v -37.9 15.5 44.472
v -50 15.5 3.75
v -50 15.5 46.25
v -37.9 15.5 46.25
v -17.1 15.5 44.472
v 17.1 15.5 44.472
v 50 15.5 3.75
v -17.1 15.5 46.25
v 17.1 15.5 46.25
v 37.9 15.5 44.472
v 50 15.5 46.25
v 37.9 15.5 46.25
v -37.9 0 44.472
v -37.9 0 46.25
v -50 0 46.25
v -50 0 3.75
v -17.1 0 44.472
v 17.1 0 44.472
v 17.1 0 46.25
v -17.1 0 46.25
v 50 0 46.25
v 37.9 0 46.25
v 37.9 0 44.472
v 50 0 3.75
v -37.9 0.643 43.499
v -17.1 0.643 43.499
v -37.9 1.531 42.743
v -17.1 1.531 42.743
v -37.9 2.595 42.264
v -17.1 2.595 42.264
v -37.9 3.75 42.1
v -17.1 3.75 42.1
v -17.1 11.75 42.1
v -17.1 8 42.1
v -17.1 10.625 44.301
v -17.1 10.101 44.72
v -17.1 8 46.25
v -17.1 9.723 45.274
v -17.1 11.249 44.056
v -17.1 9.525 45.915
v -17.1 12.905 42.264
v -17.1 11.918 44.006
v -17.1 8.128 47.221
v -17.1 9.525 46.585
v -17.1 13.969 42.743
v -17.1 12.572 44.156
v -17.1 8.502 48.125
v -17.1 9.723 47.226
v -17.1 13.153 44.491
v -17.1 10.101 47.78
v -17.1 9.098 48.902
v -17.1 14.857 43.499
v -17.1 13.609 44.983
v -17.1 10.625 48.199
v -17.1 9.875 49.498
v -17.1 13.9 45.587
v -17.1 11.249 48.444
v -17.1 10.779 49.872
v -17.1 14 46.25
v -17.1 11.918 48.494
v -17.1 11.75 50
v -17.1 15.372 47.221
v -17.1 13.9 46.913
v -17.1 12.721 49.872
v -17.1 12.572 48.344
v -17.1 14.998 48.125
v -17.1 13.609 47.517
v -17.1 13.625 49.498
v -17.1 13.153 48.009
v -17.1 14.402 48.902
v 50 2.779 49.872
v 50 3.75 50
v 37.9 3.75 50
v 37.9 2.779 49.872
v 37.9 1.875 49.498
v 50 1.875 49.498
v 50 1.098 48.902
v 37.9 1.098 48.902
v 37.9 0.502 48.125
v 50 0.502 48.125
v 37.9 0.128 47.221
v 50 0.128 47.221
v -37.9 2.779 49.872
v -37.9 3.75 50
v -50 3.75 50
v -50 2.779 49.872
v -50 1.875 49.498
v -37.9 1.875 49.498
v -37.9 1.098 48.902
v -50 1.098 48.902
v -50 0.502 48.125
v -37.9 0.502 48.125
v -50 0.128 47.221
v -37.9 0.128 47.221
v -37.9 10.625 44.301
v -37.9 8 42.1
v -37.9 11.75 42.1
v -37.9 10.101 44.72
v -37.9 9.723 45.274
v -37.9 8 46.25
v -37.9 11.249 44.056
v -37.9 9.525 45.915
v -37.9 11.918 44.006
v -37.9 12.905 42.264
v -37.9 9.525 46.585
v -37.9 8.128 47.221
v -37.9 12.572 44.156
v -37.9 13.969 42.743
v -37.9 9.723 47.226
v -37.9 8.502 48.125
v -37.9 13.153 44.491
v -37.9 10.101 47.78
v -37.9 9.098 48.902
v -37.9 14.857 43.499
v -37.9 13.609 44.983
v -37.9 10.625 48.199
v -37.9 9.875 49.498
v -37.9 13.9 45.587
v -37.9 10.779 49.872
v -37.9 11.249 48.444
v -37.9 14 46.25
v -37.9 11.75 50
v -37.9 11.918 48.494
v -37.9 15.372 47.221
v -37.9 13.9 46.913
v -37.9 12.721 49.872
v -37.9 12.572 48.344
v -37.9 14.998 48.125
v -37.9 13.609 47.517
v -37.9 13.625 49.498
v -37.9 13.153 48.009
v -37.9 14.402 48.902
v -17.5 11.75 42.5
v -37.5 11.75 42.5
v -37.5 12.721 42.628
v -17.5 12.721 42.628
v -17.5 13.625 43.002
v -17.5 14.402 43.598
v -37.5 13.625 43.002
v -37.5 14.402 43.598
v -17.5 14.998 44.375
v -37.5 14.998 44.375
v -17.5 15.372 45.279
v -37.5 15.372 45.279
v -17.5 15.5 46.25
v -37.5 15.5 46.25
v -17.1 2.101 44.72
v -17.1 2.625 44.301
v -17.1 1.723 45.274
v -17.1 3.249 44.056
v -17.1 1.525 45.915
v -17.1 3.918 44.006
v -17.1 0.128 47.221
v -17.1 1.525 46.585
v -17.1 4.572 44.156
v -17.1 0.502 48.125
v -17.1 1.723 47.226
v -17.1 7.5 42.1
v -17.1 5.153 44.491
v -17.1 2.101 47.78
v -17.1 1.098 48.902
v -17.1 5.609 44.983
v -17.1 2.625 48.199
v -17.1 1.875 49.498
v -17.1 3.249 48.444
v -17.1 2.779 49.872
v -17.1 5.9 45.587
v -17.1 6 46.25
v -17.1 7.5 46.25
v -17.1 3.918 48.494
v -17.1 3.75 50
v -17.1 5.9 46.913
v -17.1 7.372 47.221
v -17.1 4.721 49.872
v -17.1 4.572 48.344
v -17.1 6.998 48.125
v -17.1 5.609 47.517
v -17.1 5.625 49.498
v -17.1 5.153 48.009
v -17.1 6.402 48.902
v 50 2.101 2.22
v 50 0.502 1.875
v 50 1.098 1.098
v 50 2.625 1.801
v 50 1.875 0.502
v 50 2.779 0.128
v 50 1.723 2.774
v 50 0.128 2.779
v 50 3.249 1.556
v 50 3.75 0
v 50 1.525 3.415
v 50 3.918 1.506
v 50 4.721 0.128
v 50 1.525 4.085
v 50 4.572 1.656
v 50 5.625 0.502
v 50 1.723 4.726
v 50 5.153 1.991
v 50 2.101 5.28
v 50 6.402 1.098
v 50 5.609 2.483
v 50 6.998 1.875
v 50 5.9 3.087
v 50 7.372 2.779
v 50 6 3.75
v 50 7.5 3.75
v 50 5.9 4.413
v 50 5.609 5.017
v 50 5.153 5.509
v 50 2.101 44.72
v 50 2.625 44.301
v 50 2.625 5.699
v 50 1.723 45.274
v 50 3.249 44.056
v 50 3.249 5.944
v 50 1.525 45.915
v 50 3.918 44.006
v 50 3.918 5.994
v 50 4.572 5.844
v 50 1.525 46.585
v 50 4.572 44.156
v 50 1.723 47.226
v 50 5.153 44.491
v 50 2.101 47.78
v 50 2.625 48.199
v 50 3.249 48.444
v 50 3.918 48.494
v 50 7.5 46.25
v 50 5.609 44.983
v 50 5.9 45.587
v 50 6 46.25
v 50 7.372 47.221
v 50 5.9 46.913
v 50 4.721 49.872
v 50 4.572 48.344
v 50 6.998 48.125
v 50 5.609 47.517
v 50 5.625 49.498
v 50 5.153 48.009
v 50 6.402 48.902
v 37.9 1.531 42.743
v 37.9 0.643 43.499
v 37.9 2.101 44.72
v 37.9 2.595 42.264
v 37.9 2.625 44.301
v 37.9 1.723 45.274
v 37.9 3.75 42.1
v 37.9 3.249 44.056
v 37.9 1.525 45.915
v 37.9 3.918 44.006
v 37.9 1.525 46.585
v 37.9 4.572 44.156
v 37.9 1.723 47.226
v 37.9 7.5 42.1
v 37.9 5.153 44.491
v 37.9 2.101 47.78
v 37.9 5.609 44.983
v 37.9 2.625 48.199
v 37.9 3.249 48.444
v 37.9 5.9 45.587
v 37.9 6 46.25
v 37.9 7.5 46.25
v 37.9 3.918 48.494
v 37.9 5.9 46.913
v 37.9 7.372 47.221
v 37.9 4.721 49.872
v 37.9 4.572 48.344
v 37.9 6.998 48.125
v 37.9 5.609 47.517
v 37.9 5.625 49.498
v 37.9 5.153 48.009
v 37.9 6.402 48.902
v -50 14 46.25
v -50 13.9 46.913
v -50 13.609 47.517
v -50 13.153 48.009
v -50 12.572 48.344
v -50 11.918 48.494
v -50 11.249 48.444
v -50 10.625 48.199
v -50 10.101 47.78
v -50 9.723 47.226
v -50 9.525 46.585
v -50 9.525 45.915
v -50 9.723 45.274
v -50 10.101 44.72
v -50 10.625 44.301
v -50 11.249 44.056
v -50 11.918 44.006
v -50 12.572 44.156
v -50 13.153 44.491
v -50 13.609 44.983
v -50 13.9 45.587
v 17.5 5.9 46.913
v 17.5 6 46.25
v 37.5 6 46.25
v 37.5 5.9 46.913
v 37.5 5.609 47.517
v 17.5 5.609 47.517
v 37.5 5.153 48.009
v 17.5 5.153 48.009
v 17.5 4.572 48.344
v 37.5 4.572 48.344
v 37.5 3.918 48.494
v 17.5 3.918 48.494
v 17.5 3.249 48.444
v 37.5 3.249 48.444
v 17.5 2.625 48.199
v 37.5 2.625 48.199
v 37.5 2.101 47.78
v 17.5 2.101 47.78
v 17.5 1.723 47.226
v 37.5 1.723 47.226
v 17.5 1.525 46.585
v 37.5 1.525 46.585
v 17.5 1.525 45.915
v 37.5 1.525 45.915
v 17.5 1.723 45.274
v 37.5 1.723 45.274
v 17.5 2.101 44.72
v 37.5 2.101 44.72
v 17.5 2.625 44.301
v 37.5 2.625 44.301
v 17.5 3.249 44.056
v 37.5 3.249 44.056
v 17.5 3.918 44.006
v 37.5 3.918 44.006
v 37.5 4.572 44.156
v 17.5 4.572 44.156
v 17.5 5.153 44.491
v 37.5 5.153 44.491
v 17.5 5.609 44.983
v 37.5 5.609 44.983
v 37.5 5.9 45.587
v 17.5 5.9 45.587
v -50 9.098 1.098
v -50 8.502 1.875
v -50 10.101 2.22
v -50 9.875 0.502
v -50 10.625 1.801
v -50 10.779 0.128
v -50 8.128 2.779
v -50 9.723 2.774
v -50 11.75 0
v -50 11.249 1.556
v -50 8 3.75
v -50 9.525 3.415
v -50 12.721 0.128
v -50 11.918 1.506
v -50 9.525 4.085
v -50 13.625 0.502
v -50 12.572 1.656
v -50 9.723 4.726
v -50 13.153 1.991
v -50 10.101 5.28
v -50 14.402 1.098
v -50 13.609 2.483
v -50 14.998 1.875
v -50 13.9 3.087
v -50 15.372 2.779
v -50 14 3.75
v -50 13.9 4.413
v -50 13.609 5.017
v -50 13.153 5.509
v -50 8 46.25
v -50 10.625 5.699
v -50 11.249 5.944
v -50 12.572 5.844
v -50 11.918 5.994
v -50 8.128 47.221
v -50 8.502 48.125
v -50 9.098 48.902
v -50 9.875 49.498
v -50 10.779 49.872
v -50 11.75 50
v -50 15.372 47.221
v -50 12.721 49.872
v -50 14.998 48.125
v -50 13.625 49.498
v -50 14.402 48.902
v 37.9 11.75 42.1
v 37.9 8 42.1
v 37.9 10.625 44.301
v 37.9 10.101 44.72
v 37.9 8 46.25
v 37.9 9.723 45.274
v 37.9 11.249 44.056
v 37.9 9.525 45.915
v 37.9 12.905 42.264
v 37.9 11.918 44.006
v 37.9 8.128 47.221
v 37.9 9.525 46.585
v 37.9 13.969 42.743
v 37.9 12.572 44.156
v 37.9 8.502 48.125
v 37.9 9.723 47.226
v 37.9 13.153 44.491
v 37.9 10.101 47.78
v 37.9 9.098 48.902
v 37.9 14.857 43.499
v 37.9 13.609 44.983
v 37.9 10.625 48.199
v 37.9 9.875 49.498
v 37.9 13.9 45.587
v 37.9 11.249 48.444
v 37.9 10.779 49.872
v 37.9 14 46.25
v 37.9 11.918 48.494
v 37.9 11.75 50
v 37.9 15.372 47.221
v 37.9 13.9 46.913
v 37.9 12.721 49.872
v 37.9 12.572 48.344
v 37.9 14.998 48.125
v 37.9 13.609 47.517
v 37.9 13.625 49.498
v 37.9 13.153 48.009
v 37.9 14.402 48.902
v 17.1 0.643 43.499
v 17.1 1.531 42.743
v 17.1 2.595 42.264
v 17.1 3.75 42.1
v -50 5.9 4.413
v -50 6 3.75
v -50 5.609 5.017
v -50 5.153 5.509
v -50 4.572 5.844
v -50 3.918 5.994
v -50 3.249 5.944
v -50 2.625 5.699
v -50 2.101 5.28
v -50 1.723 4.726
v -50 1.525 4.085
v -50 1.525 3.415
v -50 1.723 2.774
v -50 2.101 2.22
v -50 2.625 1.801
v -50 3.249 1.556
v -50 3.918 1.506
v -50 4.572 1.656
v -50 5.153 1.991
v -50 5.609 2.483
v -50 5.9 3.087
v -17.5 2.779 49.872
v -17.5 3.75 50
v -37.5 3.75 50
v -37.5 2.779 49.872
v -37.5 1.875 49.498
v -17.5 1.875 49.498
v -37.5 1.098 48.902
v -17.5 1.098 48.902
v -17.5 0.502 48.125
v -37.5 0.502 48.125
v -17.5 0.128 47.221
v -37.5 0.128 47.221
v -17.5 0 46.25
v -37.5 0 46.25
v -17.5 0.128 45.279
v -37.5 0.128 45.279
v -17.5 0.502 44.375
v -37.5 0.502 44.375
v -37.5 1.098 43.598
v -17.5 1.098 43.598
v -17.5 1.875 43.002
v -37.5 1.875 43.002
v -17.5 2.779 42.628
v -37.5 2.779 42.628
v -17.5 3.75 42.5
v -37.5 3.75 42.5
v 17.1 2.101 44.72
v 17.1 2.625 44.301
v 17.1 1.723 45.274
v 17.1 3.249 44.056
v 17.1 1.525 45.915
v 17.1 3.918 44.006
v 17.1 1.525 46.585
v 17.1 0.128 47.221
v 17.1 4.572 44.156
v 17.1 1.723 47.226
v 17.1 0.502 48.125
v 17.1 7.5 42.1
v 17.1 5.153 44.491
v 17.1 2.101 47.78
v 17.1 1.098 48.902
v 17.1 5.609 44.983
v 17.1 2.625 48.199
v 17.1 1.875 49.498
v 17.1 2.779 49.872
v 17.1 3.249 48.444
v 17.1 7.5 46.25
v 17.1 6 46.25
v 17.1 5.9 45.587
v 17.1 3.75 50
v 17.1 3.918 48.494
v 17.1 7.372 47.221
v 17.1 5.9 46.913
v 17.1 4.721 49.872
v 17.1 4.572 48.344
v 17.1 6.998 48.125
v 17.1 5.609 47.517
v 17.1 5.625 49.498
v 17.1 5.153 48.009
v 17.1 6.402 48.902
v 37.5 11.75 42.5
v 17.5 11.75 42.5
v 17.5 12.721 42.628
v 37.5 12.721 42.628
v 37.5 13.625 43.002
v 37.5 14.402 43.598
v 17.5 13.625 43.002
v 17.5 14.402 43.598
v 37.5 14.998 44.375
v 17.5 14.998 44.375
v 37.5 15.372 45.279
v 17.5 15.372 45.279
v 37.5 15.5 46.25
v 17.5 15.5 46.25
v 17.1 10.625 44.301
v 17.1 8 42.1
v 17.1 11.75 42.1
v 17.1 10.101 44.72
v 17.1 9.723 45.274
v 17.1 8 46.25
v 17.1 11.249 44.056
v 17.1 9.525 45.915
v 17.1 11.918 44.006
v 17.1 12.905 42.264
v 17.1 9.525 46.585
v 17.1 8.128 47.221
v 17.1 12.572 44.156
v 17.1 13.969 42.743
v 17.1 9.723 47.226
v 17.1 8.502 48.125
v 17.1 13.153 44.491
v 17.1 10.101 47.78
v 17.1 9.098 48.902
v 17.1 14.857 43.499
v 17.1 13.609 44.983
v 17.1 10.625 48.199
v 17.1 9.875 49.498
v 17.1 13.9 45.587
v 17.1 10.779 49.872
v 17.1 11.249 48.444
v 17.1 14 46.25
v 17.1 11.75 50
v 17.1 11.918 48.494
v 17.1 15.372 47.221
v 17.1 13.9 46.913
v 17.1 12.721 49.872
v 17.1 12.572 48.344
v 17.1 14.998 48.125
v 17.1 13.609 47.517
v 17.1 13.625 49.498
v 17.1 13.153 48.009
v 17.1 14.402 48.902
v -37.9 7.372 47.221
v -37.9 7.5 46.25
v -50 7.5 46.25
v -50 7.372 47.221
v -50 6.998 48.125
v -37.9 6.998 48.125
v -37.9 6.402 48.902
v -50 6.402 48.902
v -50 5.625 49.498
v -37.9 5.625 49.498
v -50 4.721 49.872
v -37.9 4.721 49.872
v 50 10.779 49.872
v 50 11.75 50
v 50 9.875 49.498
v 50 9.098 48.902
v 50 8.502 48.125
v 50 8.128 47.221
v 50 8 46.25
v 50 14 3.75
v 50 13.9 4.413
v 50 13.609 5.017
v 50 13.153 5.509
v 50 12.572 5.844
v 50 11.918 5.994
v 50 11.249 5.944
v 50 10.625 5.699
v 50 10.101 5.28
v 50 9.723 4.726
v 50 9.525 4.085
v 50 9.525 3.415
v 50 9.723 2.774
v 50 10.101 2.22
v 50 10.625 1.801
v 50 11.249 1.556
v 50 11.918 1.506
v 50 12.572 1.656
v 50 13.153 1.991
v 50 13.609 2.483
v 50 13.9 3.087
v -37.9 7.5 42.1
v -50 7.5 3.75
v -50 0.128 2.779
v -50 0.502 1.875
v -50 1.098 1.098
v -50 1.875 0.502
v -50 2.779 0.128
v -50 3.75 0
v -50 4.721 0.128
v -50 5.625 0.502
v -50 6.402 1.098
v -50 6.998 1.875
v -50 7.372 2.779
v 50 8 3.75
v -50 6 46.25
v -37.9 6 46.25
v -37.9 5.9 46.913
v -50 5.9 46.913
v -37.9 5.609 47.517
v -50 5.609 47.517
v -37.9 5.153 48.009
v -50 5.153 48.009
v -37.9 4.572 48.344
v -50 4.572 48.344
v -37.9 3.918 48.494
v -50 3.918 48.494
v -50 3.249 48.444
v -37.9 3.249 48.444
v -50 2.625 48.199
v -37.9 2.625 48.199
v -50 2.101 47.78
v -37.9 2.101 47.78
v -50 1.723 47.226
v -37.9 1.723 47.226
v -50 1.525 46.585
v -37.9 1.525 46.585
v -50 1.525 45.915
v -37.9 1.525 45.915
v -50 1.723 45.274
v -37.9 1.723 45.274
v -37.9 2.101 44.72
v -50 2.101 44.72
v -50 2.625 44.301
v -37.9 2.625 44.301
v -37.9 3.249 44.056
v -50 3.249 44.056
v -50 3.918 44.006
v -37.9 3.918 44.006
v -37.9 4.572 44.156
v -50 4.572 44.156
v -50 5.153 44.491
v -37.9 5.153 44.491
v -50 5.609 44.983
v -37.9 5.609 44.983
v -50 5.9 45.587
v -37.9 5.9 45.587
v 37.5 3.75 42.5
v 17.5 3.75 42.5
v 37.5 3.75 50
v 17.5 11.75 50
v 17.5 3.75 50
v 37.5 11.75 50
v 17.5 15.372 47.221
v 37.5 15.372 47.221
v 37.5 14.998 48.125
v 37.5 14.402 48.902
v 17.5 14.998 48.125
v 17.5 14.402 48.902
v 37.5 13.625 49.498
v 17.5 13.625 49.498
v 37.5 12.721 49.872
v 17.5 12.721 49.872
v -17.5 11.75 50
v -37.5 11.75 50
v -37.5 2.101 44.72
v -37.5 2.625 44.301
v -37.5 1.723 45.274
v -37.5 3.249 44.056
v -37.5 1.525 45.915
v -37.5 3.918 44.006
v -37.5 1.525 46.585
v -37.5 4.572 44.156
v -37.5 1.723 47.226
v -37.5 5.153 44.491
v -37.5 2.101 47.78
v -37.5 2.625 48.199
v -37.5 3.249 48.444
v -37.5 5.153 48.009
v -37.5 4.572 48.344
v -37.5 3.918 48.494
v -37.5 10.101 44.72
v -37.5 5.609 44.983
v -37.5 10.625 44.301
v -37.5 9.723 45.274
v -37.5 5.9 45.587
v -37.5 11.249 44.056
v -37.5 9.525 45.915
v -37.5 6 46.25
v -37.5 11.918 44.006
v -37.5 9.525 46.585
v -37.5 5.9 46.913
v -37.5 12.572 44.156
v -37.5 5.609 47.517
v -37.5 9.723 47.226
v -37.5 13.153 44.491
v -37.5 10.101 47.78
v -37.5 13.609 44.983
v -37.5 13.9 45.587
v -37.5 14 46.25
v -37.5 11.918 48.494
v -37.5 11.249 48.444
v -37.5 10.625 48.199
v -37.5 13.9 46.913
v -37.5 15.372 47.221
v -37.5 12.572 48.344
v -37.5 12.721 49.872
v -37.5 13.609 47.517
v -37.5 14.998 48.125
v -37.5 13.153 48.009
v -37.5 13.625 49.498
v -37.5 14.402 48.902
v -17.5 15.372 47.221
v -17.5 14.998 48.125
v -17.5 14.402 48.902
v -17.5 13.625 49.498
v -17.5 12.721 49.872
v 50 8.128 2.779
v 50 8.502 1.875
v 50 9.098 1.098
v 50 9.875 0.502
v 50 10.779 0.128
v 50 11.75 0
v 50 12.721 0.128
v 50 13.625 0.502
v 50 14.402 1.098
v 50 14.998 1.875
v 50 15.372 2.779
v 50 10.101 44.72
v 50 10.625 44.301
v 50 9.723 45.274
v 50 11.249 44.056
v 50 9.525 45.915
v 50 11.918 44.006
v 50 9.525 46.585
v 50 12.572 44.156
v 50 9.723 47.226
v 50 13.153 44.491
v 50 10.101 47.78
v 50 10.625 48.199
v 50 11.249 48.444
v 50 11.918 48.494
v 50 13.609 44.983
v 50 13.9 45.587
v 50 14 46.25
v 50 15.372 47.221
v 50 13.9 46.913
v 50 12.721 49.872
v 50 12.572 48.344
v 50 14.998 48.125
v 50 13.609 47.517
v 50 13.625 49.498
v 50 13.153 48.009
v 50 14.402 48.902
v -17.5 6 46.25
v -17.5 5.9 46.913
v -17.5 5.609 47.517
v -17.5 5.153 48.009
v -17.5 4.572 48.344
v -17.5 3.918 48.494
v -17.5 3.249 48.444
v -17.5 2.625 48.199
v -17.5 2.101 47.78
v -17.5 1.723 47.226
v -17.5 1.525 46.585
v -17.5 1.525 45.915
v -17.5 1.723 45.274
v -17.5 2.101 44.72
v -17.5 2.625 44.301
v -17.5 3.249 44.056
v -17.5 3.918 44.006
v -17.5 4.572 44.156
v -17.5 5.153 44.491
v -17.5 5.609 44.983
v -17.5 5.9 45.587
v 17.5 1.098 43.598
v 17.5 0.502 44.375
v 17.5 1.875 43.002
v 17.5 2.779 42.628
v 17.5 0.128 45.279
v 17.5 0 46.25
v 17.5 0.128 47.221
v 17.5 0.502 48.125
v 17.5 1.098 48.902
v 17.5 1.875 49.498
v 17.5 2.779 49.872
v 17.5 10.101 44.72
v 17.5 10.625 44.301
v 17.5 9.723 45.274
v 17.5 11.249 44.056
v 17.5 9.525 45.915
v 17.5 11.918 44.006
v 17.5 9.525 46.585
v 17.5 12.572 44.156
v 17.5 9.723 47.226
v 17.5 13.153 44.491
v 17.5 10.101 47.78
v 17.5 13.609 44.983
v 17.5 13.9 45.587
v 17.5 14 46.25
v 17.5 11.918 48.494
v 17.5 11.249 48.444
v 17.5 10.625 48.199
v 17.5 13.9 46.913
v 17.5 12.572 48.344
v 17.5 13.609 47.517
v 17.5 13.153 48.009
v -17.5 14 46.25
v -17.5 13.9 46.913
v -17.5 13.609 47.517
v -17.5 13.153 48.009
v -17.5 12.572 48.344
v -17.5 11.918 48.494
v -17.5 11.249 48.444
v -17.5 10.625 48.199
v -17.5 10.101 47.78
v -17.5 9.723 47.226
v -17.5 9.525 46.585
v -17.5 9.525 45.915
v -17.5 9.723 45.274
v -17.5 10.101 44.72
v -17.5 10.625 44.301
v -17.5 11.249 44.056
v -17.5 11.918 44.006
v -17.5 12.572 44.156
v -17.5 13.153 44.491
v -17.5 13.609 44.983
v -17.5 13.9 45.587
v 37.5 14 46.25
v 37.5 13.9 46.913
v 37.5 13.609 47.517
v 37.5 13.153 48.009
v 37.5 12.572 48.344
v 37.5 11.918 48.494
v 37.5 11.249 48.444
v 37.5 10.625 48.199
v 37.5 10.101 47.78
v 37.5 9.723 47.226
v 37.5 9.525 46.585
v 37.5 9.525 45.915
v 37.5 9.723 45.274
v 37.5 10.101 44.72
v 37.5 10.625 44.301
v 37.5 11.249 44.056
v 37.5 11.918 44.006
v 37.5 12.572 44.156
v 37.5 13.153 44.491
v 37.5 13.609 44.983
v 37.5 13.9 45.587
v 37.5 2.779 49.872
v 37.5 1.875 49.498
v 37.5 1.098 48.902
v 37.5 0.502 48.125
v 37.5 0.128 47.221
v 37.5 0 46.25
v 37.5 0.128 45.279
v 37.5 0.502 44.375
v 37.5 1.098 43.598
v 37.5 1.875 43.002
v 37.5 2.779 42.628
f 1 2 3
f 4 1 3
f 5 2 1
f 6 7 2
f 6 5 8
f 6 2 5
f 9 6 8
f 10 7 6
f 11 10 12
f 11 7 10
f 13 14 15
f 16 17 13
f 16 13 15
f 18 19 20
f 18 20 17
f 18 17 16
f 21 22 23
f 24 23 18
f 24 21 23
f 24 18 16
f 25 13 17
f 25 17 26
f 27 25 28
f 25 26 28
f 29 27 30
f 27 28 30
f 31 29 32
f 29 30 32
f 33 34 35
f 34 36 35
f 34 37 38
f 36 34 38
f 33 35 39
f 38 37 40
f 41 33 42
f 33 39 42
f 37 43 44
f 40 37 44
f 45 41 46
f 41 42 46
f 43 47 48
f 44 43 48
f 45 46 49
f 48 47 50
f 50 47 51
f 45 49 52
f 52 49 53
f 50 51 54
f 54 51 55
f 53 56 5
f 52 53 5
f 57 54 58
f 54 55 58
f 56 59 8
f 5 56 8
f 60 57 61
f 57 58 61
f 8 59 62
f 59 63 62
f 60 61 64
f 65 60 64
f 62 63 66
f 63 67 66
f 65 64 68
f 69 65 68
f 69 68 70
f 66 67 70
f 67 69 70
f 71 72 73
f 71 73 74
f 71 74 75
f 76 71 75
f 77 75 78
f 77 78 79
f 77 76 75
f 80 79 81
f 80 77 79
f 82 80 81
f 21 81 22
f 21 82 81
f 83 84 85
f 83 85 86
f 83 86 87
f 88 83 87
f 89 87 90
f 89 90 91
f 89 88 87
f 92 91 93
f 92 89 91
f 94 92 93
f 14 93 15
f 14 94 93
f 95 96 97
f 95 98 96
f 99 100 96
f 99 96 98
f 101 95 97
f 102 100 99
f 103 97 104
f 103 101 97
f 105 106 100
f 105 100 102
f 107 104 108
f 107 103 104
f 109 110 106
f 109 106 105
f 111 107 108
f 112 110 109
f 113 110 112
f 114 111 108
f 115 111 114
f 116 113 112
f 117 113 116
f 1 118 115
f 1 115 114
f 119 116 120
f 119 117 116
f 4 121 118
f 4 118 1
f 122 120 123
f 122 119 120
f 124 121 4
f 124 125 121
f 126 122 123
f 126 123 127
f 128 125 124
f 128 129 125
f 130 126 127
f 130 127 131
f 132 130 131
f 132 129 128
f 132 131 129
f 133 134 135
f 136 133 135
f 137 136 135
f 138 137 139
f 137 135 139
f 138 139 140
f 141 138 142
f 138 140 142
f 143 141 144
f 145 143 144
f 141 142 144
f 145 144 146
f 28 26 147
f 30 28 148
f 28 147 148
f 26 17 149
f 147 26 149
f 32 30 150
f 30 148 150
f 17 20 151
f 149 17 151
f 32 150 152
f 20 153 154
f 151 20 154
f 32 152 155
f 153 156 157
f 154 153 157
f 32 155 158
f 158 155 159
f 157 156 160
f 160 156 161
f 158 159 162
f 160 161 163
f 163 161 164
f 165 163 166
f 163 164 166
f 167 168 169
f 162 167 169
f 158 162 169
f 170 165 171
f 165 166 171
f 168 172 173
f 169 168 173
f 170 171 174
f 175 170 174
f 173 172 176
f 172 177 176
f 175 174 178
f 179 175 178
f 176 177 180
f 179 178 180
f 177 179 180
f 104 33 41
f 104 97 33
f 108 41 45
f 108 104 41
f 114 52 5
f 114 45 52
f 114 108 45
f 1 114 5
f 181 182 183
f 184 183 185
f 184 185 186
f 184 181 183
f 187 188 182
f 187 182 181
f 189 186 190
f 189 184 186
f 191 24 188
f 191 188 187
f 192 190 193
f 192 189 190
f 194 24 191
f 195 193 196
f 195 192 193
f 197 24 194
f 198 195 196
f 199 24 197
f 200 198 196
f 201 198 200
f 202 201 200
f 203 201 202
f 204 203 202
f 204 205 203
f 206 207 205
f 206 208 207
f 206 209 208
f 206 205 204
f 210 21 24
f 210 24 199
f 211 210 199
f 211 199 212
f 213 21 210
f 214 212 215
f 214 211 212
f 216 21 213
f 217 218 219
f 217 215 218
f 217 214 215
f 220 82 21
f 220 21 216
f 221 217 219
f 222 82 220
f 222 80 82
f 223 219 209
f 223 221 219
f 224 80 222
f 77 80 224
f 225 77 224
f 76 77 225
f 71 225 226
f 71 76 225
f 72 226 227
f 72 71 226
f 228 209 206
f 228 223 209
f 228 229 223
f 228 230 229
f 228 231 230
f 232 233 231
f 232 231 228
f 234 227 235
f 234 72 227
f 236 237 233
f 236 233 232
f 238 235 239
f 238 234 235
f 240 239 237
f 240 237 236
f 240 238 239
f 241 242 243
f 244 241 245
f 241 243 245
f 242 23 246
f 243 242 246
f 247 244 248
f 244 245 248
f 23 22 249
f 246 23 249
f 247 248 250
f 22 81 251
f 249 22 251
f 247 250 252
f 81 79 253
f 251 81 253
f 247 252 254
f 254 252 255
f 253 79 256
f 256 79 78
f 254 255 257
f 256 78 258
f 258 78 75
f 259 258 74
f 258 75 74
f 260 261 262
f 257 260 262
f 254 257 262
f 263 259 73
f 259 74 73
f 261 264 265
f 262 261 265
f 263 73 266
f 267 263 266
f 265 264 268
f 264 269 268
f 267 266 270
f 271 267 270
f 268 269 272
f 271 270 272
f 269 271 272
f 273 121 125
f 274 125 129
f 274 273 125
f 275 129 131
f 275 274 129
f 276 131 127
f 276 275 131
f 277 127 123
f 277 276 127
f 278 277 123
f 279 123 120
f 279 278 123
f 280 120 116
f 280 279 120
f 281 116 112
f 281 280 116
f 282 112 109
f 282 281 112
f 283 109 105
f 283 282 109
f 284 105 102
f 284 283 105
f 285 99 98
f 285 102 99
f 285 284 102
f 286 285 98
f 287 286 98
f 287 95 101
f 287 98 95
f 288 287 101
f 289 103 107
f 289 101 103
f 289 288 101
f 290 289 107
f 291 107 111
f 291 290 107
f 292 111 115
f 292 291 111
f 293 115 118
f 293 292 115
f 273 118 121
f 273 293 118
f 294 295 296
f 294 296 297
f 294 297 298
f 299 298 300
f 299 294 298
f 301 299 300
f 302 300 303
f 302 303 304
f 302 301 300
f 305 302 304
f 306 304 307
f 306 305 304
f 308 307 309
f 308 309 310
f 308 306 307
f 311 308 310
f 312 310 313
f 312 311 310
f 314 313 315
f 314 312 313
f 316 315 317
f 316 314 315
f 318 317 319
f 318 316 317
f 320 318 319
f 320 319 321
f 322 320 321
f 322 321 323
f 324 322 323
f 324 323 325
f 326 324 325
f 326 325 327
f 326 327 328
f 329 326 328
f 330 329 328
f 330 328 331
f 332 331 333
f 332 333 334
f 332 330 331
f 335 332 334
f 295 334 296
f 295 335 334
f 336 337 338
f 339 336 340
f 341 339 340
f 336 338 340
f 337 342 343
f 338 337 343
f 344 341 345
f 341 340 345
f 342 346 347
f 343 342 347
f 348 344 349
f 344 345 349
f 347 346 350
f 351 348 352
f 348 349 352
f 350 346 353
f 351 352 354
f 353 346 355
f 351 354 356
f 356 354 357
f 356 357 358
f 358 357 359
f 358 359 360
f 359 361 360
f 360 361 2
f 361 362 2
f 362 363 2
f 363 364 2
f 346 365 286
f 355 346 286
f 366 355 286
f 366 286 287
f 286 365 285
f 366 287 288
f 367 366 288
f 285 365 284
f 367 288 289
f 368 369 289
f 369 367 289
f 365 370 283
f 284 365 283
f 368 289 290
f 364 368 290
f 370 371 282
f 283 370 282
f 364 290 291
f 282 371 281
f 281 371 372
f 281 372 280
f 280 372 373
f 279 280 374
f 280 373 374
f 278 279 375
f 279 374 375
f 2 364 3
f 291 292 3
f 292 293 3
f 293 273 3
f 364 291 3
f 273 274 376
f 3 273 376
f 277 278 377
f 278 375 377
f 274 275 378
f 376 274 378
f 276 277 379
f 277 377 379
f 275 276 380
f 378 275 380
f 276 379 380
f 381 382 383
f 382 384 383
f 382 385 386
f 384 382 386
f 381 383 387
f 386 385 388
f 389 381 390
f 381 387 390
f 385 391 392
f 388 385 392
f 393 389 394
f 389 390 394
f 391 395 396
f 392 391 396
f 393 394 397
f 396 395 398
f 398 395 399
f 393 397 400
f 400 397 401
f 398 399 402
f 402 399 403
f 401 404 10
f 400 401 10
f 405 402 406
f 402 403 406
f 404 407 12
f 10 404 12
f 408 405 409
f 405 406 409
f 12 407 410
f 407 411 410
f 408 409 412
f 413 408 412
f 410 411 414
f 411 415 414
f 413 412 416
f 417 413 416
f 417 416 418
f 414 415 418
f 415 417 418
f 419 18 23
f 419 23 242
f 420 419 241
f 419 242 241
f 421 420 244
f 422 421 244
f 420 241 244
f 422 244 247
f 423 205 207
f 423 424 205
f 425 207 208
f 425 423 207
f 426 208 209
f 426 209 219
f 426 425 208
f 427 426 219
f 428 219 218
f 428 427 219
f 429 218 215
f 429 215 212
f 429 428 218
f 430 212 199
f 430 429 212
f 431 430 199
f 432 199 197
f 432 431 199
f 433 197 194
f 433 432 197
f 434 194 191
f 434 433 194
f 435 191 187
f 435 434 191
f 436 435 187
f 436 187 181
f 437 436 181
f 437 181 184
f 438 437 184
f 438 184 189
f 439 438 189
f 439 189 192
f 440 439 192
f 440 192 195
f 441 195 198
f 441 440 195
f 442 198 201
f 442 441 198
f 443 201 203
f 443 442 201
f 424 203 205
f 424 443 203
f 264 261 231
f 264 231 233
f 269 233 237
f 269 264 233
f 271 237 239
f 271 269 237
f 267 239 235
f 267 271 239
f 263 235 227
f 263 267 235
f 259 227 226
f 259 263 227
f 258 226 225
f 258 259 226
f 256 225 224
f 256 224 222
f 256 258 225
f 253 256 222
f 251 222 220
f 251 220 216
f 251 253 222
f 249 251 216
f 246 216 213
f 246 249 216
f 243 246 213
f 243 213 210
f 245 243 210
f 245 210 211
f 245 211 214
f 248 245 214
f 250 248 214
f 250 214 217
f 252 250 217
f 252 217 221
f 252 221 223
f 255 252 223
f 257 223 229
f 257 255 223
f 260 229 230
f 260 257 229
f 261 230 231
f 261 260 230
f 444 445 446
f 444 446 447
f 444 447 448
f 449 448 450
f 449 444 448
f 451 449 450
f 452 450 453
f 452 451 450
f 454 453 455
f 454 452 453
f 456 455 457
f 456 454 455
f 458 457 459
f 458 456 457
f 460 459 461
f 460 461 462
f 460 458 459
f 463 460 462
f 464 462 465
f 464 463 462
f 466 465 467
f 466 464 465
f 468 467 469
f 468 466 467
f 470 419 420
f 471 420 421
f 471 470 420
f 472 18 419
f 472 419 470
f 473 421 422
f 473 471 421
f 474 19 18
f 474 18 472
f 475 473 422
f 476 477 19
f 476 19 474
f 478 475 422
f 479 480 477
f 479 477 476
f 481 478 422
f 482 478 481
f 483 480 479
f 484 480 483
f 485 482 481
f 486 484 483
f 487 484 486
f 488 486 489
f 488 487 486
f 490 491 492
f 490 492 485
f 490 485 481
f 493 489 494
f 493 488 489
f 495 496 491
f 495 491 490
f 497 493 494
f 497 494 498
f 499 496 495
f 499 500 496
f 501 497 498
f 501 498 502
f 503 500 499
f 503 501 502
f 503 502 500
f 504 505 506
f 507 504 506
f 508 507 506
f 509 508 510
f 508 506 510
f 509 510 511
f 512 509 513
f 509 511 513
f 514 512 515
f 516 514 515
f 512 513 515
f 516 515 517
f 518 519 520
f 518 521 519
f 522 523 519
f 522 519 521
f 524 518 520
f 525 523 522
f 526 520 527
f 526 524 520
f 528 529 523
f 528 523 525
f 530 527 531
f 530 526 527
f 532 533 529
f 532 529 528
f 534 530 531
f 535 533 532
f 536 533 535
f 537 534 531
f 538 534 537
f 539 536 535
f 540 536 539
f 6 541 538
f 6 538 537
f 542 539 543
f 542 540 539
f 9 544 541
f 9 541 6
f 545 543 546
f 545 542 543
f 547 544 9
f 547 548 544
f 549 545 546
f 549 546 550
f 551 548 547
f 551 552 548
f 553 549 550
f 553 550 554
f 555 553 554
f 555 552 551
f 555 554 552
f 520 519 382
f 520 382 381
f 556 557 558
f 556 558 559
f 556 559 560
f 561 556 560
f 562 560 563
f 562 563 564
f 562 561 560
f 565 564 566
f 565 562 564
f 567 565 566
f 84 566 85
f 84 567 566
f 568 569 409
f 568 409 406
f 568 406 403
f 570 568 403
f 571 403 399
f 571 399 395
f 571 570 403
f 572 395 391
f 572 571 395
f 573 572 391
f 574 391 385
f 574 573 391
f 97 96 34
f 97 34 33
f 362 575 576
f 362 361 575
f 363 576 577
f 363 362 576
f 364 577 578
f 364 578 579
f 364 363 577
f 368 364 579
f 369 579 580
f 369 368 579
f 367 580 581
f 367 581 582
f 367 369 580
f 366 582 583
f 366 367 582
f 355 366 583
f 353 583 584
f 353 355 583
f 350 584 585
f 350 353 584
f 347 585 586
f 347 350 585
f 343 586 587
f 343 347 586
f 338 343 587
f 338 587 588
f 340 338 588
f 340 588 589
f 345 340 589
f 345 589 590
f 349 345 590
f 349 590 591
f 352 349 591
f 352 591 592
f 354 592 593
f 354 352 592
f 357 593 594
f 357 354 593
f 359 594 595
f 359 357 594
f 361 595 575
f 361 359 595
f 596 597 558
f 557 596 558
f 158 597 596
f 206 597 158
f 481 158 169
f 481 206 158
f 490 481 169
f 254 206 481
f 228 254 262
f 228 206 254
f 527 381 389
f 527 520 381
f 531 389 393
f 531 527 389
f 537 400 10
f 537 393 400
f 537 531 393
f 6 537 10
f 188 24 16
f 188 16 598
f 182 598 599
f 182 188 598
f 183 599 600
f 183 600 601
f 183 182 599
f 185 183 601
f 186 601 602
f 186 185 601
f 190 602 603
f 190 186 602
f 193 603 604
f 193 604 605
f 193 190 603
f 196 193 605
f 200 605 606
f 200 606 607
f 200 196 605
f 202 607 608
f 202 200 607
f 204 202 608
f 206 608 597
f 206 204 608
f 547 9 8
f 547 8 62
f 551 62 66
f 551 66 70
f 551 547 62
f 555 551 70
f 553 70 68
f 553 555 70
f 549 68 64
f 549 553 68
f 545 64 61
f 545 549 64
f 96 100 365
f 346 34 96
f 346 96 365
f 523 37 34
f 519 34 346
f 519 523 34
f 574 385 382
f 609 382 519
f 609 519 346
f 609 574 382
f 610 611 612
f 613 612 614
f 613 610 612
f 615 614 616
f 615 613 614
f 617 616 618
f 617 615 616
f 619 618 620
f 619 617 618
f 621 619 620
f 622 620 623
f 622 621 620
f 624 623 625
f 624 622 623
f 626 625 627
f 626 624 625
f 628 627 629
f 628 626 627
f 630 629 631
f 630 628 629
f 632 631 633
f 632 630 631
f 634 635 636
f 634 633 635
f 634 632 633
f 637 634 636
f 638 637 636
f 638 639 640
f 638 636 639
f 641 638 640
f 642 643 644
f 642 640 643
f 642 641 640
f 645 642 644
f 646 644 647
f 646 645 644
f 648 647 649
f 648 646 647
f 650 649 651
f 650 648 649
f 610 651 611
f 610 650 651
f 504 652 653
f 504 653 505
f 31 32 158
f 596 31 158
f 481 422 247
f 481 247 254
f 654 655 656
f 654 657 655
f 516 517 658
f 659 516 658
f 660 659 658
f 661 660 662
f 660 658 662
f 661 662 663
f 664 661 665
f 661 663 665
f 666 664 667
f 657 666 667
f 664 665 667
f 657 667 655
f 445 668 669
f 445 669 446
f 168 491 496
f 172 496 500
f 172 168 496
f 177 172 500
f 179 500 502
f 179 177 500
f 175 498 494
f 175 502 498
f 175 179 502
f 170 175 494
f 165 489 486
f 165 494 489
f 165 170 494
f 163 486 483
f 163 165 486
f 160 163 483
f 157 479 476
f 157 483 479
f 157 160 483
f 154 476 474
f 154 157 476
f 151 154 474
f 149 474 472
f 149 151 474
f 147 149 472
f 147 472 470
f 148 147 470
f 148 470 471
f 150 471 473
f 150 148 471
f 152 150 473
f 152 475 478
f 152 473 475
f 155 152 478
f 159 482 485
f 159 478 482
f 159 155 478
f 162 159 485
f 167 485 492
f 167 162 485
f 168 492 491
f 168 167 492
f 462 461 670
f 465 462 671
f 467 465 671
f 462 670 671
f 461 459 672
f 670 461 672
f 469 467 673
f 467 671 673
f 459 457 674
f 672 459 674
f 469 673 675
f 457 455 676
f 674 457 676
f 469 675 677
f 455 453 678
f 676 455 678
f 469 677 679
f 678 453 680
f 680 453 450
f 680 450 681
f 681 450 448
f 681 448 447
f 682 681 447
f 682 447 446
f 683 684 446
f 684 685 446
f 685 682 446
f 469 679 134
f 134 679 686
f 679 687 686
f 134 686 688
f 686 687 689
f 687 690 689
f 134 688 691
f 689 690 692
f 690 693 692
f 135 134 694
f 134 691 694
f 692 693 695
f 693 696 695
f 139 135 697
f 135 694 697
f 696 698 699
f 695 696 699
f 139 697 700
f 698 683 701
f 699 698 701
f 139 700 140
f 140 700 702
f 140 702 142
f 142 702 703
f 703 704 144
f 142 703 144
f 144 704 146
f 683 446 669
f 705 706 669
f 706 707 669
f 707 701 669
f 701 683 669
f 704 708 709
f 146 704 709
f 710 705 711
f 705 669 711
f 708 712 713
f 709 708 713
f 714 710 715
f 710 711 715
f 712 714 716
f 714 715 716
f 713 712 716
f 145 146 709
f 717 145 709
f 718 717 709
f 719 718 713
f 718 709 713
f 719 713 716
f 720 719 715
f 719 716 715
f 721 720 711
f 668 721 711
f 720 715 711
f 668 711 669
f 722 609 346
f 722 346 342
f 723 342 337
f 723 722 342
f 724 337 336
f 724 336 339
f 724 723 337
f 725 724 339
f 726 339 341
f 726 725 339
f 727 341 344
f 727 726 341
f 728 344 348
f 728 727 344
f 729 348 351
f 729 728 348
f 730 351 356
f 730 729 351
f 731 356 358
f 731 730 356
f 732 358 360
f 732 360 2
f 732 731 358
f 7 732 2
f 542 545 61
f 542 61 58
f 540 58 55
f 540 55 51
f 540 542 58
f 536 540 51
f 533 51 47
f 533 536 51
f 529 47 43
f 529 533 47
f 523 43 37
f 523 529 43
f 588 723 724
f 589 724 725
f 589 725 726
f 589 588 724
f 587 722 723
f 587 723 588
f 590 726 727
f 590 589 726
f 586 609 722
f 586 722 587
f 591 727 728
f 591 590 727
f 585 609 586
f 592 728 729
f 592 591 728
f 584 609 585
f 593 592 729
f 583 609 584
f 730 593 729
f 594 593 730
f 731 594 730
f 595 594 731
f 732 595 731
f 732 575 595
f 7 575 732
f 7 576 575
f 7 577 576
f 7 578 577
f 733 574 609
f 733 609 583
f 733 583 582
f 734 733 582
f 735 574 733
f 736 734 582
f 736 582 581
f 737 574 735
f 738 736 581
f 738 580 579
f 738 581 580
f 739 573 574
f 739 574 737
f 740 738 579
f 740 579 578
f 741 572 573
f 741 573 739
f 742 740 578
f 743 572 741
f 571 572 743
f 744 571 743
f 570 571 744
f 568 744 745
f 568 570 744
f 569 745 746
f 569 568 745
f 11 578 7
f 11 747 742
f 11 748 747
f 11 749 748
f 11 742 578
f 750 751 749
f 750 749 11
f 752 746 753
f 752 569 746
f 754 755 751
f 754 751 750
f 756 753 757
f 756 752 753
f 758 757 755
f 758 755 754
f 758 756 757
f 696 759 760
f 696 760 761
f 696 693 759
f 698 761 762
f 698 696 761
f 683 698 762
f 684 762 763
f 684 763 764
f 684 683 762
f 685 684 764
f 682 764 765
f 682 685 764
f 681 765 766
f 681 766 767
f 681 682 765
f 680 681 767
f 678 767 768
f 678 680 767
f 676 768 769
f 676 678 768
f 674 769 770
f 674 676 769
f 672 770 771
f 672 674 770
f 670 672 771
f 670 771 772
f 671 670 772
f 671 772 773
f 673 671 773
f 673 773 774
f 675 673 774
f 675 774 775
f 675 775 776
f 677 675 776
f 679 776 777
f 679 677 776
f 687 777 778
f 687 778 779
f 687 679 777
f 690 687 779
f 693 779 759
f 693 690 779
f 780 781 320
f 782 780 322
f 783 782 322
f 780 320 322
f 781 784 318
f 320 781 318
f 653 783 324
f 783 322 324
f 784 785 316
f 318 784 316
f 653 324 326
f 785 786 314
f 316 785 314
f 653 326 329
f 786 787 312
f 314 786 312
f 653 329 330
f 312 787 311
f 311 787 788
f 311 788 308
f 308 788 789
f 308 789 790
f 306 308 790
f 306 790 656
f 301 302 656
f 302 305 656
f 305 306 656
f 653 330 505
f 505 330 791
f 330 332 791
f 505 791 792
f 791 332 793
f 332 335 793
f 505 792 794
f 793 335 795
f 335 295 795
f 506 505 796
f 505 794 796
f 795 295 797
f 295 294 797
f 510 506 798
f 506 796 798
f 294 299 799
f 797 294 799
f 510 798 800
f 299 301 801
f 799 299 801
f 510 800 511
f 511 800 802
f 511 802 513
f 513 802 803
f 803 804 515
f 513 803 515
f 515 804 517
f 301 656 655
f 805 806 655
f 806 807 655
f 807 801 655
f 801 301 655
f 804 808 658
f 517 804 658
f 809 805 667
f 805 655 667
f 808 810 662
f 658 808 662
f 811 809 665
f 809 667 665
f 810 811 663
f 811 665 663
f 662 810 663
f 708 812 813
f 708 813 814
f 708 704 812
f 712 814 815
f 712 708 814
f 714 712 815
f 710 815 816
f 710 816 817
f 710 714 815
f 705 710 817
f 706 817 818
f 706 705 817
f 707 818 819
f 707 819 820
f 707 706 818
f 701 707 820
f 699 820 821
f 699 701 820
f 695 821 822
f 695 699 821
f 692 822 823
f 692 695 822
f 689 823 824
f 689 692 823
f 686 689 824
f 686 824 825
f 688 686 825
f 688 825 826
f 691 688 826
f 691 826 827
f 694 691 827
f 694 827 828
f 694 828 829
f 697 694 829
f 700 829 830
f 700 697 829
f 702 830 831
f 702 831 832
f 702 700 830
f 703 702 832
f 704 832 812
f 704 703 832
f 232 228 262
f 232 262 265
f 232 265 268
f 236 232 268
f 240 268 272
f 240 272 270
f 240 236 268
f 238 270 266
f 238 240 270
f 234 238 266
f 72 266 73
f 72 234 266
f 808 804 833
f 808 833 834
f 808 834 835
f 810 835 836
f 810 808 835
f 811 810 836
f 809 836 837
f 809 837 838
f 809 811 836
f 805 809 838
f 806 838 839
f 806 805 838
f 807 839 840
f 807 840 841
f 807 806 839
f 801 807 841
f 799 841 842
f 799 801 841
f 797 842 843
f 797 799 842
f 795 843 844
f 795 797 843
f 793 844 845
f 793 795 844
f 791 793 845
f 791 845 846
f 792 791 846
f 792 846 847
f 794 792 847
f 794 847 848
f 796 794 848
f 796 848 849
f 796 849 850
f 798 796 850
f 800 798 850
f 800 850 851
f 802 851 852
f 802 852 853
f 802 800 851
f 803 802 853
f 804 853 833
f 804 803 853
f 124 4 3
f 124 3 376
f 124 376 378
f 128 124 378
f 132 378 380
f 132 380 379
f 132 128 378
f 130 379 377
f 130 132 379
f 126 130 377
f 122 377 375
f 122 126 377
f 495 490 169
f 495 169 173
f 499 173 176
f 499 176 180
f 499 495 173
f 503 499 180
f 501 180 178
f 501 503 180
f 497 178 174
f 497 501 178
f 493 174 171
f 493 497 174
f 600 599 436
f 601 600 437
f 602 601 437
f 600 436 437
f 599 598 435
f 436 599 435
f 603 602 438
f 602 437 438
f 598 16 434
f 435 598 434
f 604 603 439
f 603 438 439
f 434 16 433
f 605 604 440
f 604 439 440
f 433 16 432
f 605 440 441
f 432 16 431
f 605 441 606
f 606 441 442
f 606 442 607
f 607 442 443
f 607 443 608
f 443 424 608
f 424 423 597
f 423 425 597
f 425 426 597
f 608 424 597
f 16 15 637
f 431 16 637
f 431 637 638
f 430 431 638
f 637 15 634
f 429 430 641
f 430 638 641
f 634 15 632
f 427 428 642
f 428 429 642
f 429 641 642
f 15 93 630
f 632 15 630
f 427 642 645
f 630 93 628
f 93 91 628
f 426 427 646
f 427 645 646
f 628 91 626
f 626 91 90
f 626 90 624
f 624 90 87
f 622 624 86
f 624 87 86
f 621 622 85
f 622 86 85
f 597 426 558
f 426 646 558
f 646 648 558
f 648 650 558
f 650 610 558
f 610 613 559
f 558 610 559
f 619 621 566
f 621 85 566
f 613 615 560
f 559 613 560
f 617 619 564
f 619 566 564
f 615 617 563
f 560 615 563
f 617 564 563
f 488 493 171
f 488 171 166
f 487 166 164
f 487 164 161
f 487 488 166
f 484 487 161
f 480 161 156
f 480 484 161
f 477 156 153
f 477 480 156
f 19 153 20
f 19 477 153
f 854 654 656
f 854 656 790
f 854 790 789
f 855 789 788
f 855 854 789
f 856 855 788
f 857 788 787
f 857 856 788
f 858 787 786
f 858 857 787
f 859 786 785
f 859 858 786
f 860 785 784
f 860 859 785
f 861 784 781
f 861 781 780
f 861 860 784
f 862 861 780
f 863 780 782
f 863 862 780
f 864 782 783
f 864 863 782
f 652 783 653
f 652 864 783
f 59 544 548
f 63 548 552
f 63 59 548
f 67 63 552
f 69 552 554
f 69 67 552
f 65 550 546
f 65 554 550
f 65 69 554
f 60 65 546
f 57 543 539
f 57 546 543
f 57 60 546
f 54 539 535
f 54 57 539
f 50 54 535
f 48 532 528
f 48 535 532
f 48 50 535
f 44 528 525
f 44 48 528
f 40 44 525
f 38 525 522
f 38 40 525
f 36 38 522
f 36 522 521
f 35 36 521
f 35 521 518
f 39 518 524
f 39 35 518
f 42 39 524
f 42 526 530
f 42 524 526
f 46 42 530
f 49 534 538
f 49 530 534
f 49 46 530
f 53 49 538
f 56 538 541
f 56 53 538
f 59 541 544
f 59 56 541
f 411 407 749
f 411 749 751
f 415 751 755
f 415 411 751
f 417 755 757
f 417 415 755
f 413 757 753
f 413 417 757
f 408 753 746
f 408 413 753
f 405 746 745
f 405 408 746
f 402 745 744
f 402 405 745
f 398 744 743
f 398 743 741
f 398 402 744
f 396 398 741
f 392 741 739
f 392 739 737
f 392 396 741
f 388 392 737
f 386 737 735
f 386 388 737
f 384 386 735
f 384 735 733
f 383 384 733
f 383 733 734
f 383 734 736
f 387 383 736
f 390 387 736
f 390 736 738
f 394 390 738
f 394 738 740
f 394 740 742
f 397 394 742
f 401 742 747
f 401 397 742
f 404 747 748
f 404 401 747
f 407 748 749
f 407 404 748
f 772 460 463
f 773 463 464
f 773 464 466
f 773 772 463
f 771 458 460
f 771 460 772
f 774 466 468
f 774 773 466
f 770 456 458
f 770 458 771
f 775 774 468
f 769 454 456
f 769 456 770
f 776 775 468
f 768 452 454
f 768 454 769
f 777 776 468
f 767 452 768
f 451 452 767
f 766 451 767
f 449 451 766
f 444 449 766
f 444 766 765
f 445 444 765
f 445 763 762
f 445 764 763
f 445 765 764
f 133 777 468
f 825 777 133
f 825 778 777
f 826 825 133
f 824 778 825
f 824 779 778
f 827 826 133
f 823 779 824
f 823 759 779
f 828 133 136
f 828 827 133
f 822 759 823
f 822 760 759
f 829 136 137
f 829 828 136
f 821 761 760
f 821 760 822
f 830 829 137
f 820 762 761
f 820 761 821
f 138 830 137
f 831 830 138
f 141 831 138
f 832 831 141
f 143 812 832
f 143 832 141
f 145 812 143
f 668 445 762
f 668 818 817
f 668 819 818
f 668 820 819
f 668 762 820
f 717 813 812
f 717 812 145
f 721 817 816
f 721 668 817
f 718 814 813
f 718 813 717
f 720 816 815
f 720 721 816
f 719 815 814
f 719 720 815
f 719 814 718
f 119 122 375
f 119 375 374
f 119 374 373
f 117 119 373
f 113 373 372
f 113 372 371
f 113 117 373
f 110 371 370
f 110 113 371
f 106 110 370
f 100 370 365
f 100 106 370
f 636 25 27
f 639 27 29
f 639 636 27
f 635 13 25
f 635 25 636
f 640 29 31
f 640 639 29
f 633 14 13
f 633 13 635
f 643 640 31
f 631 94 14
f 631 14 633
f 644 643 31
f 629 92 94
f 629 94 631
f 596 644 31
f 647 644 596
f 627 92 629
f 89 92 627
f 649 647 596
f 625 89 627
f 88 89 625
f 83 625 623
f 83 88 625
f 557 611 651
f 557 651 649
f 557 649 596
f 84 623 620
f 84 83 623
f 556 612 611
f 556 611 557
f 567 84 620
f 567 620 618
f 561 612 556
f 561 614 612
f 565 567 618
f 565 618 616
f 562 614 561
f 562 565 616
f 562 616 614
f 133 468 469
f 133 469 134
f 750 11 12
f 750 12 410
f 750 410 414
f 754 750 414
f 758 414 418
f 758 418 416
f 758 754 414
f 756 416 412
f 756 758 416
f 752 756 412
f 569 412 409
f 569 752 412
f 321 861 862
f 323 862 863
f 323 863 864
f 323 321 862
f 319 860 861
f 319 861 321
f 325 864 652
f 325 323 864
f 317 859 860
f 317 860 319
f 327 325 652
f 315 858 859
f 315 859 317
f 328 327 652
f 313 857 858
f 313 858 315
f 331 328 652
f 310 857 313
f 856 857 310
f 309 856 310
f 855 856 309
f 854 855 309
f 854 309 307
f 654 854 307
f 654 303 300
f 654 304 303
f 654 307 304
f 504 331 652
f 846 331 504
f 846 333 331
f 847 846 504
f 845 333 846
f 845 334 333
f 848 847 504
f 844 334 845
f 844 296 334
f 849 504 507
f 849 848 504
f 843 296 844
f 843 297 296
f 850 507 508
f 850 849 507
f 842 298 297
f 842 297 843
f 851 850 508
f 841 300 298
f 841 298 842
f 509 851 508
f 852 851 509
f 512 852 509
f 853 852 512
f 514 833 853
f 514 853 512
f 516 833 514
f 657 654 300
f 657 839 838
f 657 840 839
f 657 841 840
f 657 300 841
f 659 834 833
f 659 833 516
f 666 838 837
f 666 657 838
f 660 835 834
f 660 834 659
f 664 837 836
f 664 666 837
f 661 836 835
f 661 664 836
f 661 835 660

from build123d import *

# Parameters (mm, degrees)
F0_R      = 2.25
F1_DEPTH  = 50
F2_DEPTH  = 37.5
F3_DEPTH  = 17.5
F4_OFFSET = 0.4


with BuildPart() as f1:
    # F0 (on Right) → F1 (new body, symmetric)
    with BuildSketch(Plane.YZ):
        with BuildLine():
            Line((0, 46.25), (0, 3.75))
            ThreePointArc((0, 3.75), (1.0983495706, 6.4016504294), (3.75, 7.5))
            Line((3.75, 7.5), (7.5, 7.5))
            Line((7.5, 7.5), (7.5, 42.5))
            Line((7.5, 42.5), (3.75, 42.5))
            ThreePointArc((3.75, 42.5), (1.0983495706, 43.5983495706), (0, 46.25))
        make_face()
        with BuildLine():
            ThreePointArc((0, 3.75), (1.0983495706, 1.0983495706), (3.75, 0))
            ThreePointArc((3.75, 0), (6.4016504294, 1.0983495706), (7.5, 3.75))
            ThreePointArc((7.5, 3.75), (6.4016504294, 6.4016504294), (3.75, 7.5))
            ThreePointArc((3.75, 7.5), (1.0983495706, 6.4016504294), (0, 3.75))
        make_face()
        with Locations((3.75, 3.75)):
            Circle(F0_R, mode=Mode.SUBTRACT)
        with BuildLine():
            ThreePointArc((3.75, 7.5), (6.4016504294, 6.4016504294), (7.5, 3.75))
            Line((7.5, 3.75), (7.5, 7.5))
            Line((7.5, 7.5), (3.75, 7.5))
        make_face()
        with BuildLine():
            ThreePointArc((7.5, 46.25), (6.4016504294, 43.5983495706), (3.75, 42.5))
            Line((3.75, 42.5), (7.5, 42.5))
            Line((7.5, 42.5), (7.5, 46.25))
        make_face()
        with BuildLine():
            ThreePointArc((3.75, 50), (1.0983495706, 48.9016504294), (0, 46.25))
            ThreePointArc((0, 46.25), (1.0983495706, 43.5983495706), (3.75, 42.5))
            ThreePointArc((3.75, 42.5), (6.4016504294, 43.5983495706), (7.5, 46.25))
            ThreePointArc((7.5, 46.25), (6.4016504294, 48.9016504294), (3.75, 50))
        make_face()
        with Locations((3.75, 46.25)):
            Circle(F0_R, mode=Mode.SUBTRACT)
    extrude(amount=F1_DEPTH, both=True)


with BuildPart() as f1b:
    # F0 (on Right) → F1, piece 2 (new body, symmetric)
    with BuildSketch(Plane.YZ):
        with BuildLine():
            ThreePointArc((15.5, 46.25), (14.4016504294, 48.9016504294), (11.75, 50))
            ThreePointArc((11.75, 50), (9.0983495706, 48.9016504294), (8, 46.25))
            ThreePointArc((8, 46.25), (9.0983495706, 43.5983495706), (11.75, 42.5))
            ThreePointArc((11.75, 42.5), (14.4016504294, 43.5983495706), (15.5, 46.25))
        make_face()
        with Locations((11.75, 46.25)):
            Circle(F0_R, mode=Mode.SUBTRACT)
        with BuildLine():
            Line((8, 46.25), (8, 42.5))
            Line((8, 42.5), (11.75, 42.5))
            ThreePointArc((11.75, 42.5), (9.0983495706, 43.5983495706), (8, 46.25))
        make_face()
        with BuildLine():
            Line((8, 42.5), (8, 7.5))
            Line((8, 7.5), (11.75, 7.5))
            Line((11.75, 7.5), (15.5, 7.5))
            Line((15.5, 7.5), (15.5, 46.25))
            ThreePointArc((15.5, 46.25), (14.4016504294, 43.5983495706), (11.75, 42.5))
            Line((11.75, 42.5), (8, 42.5))
        make_face()
        with BuildLine():
            ThreePointArc((11.75, 7.5), (14.4016504294, 6.4016504294), (15.5, 3.75))
            Line((15.5, 3.75), (15.5, 7.5))
            Line((15.5, 7.5), (11.75, 7.5))
        make_face()
        with BuildLine():
            Line((8, 7.5), (8, 3.75))
            ThreePointArc((8, 3.75), (9.0983495706, 6.4016504294), (11.75, 7.5))
            Line((11.75, 7.5), (8, 7.5))
        make_face()
        with BuildLine():
            ThreePointArc((8, 3.75), (9.0983495706, 1.0983495706), (11.75, 0))
            ThreePointArc((11.75, 0), (14.4016504294, 1.0983495706), (15.5, 3.75))
            ThreePointArc((15.5, 3.75), (14.4016504294, 6.4016504294), (11.75, 7.5))
            ThreePointArc((11.75, 7.5), (9.0983495706, 6.4016504294), (8, 3.75))
        make_face()
        with Locations((11.75, 3.75)):
            Circle(F0_R, mode=Mode.SUBTRACT)
        with BuildLine():
            Line((8, 42.5), (8, 7.5))
            Line((8, 7.5), (11.75, 7.5))
            Line((11.75, 7.5), (15.5, 7.5))
            Line((15.5, 7.5), (15.5, 46.25))
            ThreePointArc((15.5, 46.25), (14.4016504294, 43.5983495706), (11.75, 42.5))
            Line((11.75, 42.5), (8, 42.5))
        make_face()
    extrude(amount=F1_DEPTH, both=True)


with BuildPart() as f2:
    # F0 (on Right) → F2 (new body, symmetric)
    with BuildSketch(Plane.YZ):
        with BuildLine():
            ThreePointArc((3.75, 50), (1.0983495706, 48.9016504294), (0, 46.25))
            ThreePointArc((0, 46.25), (1.0983495706, 43.5983495706), (3.75, 42.5))
            ThreePointArc((3.75, 42.5), (6.4016504294, 43.5983495706), (7.5, 46.25))
            ThreePointArc((7.5, 46.25), (6.4016504294, 48.9016504294), (3.75, 50))
        make_face()
        with Locations((3.75, 46.25)):
            Circle(F0_R, mode=Mode.SUBTRACT)
        with BuildLine():
            ThreePointArc((7.5, 46.25), (6.4016504294, 43.5983495706), (3.75, 42.5))
            Line((3.75, 42.5), (7.5, 42.5))
            Line((7.5, 42.5), (7.5, 46.25))
        make_face()
        with BuildLine():
            Line((7.5, 46.25), (7.5, 42.5))
            Line((7.5, 42.5), (8, 42.5))
            Line((8, 42.5), (8, 46.25))
            ThreePointArc((8, 46.25), (9.0983495706, 48.9016504294), (11.75, 50))
            Line((11.75, 50), (7.5, 50))
            Line((7.5, 50), (7.5, 46.25))
        make_face()
        with BuildLine():
            Line((8, 46.25), (8, 42.5))
            Line((8, 42.5), (11.75, 42.5))
            ThreePointArc((11.75, 42.5), (9.0983495706, 43.5983495706), (8, 46.25))
        make_face()
        with BuildLine():
            Line((7.5, 50), (3.75, 50))
            ThreePointArc((3.75, 50), (6.4016504294, 48.9016504294), (7.5, 46.25))
            Line((7.5, 46.25), (7.5, 50))
        make_face()
        with BuildLine():
            ThreePointArc((15.5, 46.25), (14.4016504294, 48.9016504294), (11.75, 50))
            ThreePointArc((11.75, 50), (9.0983495706, 48.9016504294), (8, 46.25))
            ThreePointArc((8, 46.25), (9.0983495706, 43.5983495706), (11.75, 42.5))
            ThreePointArc((11.75, 42.5), (14.4016504294, 43.5983495706), (15.5, 46.25))
        make_face()
        with Locations((11.75, 46.25)):
            Circle(F0_R, mode=Mode.SUBTRACT)
    extrude(amount=F2_DEPTH, both=True)

    # F0 (on Right) → F3 (cut, symmetric)
    with BuildSketch(Plane.YZ):
        with BuildLine():
            ThreePointArc((3.75, 50), (1.0983495706, 48.9016504294), (0, 46.25))
            ThreePointArc((0, 46.25), (1.0983495706, 43.5983495706), (3.75, 42.5))
            ThreePointArc((3.75, 42.5), (6.4016504294, 43.5983495706), (7.5, 46.25))
            ThreePointArc((7.5, 46.25), (6.4016504294, 48.9016504294), (3.75, 50))
        make_face()
        with Locations((3.75, 46.25)):
            Circle(F0_R, mode=Mode.SUBTRACT)
        with BuildLine():
            Line((7.5, 50), (3.75, 50))
            ThreePointArc((3.75, 50), (6.4016504294, 48.9016504294), (7.5, 46.25))
            Line((7.5, 46.25), (7.5, 50))
        make_face()
        with BuildLine():
            Line((7.5, 46.25), (7.5, 42.5))
            Line((7.5, 42.5), (8, 42.5))
            Line((8, 42.5), (8, 46.25))
            ThreePointArc((8, 46.25), (9.0983495706, 48.9016504294), (11.75, 50))
            Line((11.75, 50), (7.5, 50))
            Line((7.5, 50), (7.5, 46.25))
        make_face()
        with BuildLine():
            ThreePointArc((15.5, 46.25), (14.4016504294, 48.9016504294), (11.75, 50))
            ThreePointArc((11.75, 50), (9.0983495706, 48.9016504294), (8, 46.25))
            ThreePointArc((8, 46.25), (9.0983495706, 43.5983495706), (11.75, 42.5))
            ThreePointArc((11.75, 42.5), (14.4016504294, 43.5983495706), (15.5, 46.25))
        make_face()
        with Locations((11.75, 46.25)):
            Circle(F0_R, mode=Mode.SUBTRACT)
        with BuildLine():
            Line((8, 46.25), (8, 42.5))
            Line((8, 42.5), (11.75, 42.5))
            ThreePointArc((11.75, 42.5), (9.0983495706, 43.5983495706), (8, 46.25))
        make_face()
        with BuildLine():
            ThreePointArc((7.5, 46.25), (6.4016504294, 43.5983495706), (3.75, 42.5))
            Line((3.75, 42.5), (7.5, 42.5))
            Line((7.5, 42.5), (7.5, 46.25))
        make_face()
    extrude(amount=F3_DEPTH, both=True, mode=Mode.SUBTRACT)


with BuildPart() as f1_1:
    add(f1.part)

    # F4: cut F2, made larger all round first
    f4_tool = offset(f2.part, amount=F4_OFFSET, kind=Kind.INTERSECTION, mode=Mode.PRIVATE)
    add(f4_tool, mode=Mode.SUBTRACT)


with BuildPart() as f1b_1:
    add(f1b.part)

    # F4: cut F2, made larger all round first
    f4_tool = offset(f2.part, amount=F4_OFFSET, kind=Kind.INTERSECTION, mode=Mode.PRIVATE)
    add(f4_tool, mode=Mode.SUBTRACT)


solid = Compound([f2.part, f1_1.part, f1b_1.part])
